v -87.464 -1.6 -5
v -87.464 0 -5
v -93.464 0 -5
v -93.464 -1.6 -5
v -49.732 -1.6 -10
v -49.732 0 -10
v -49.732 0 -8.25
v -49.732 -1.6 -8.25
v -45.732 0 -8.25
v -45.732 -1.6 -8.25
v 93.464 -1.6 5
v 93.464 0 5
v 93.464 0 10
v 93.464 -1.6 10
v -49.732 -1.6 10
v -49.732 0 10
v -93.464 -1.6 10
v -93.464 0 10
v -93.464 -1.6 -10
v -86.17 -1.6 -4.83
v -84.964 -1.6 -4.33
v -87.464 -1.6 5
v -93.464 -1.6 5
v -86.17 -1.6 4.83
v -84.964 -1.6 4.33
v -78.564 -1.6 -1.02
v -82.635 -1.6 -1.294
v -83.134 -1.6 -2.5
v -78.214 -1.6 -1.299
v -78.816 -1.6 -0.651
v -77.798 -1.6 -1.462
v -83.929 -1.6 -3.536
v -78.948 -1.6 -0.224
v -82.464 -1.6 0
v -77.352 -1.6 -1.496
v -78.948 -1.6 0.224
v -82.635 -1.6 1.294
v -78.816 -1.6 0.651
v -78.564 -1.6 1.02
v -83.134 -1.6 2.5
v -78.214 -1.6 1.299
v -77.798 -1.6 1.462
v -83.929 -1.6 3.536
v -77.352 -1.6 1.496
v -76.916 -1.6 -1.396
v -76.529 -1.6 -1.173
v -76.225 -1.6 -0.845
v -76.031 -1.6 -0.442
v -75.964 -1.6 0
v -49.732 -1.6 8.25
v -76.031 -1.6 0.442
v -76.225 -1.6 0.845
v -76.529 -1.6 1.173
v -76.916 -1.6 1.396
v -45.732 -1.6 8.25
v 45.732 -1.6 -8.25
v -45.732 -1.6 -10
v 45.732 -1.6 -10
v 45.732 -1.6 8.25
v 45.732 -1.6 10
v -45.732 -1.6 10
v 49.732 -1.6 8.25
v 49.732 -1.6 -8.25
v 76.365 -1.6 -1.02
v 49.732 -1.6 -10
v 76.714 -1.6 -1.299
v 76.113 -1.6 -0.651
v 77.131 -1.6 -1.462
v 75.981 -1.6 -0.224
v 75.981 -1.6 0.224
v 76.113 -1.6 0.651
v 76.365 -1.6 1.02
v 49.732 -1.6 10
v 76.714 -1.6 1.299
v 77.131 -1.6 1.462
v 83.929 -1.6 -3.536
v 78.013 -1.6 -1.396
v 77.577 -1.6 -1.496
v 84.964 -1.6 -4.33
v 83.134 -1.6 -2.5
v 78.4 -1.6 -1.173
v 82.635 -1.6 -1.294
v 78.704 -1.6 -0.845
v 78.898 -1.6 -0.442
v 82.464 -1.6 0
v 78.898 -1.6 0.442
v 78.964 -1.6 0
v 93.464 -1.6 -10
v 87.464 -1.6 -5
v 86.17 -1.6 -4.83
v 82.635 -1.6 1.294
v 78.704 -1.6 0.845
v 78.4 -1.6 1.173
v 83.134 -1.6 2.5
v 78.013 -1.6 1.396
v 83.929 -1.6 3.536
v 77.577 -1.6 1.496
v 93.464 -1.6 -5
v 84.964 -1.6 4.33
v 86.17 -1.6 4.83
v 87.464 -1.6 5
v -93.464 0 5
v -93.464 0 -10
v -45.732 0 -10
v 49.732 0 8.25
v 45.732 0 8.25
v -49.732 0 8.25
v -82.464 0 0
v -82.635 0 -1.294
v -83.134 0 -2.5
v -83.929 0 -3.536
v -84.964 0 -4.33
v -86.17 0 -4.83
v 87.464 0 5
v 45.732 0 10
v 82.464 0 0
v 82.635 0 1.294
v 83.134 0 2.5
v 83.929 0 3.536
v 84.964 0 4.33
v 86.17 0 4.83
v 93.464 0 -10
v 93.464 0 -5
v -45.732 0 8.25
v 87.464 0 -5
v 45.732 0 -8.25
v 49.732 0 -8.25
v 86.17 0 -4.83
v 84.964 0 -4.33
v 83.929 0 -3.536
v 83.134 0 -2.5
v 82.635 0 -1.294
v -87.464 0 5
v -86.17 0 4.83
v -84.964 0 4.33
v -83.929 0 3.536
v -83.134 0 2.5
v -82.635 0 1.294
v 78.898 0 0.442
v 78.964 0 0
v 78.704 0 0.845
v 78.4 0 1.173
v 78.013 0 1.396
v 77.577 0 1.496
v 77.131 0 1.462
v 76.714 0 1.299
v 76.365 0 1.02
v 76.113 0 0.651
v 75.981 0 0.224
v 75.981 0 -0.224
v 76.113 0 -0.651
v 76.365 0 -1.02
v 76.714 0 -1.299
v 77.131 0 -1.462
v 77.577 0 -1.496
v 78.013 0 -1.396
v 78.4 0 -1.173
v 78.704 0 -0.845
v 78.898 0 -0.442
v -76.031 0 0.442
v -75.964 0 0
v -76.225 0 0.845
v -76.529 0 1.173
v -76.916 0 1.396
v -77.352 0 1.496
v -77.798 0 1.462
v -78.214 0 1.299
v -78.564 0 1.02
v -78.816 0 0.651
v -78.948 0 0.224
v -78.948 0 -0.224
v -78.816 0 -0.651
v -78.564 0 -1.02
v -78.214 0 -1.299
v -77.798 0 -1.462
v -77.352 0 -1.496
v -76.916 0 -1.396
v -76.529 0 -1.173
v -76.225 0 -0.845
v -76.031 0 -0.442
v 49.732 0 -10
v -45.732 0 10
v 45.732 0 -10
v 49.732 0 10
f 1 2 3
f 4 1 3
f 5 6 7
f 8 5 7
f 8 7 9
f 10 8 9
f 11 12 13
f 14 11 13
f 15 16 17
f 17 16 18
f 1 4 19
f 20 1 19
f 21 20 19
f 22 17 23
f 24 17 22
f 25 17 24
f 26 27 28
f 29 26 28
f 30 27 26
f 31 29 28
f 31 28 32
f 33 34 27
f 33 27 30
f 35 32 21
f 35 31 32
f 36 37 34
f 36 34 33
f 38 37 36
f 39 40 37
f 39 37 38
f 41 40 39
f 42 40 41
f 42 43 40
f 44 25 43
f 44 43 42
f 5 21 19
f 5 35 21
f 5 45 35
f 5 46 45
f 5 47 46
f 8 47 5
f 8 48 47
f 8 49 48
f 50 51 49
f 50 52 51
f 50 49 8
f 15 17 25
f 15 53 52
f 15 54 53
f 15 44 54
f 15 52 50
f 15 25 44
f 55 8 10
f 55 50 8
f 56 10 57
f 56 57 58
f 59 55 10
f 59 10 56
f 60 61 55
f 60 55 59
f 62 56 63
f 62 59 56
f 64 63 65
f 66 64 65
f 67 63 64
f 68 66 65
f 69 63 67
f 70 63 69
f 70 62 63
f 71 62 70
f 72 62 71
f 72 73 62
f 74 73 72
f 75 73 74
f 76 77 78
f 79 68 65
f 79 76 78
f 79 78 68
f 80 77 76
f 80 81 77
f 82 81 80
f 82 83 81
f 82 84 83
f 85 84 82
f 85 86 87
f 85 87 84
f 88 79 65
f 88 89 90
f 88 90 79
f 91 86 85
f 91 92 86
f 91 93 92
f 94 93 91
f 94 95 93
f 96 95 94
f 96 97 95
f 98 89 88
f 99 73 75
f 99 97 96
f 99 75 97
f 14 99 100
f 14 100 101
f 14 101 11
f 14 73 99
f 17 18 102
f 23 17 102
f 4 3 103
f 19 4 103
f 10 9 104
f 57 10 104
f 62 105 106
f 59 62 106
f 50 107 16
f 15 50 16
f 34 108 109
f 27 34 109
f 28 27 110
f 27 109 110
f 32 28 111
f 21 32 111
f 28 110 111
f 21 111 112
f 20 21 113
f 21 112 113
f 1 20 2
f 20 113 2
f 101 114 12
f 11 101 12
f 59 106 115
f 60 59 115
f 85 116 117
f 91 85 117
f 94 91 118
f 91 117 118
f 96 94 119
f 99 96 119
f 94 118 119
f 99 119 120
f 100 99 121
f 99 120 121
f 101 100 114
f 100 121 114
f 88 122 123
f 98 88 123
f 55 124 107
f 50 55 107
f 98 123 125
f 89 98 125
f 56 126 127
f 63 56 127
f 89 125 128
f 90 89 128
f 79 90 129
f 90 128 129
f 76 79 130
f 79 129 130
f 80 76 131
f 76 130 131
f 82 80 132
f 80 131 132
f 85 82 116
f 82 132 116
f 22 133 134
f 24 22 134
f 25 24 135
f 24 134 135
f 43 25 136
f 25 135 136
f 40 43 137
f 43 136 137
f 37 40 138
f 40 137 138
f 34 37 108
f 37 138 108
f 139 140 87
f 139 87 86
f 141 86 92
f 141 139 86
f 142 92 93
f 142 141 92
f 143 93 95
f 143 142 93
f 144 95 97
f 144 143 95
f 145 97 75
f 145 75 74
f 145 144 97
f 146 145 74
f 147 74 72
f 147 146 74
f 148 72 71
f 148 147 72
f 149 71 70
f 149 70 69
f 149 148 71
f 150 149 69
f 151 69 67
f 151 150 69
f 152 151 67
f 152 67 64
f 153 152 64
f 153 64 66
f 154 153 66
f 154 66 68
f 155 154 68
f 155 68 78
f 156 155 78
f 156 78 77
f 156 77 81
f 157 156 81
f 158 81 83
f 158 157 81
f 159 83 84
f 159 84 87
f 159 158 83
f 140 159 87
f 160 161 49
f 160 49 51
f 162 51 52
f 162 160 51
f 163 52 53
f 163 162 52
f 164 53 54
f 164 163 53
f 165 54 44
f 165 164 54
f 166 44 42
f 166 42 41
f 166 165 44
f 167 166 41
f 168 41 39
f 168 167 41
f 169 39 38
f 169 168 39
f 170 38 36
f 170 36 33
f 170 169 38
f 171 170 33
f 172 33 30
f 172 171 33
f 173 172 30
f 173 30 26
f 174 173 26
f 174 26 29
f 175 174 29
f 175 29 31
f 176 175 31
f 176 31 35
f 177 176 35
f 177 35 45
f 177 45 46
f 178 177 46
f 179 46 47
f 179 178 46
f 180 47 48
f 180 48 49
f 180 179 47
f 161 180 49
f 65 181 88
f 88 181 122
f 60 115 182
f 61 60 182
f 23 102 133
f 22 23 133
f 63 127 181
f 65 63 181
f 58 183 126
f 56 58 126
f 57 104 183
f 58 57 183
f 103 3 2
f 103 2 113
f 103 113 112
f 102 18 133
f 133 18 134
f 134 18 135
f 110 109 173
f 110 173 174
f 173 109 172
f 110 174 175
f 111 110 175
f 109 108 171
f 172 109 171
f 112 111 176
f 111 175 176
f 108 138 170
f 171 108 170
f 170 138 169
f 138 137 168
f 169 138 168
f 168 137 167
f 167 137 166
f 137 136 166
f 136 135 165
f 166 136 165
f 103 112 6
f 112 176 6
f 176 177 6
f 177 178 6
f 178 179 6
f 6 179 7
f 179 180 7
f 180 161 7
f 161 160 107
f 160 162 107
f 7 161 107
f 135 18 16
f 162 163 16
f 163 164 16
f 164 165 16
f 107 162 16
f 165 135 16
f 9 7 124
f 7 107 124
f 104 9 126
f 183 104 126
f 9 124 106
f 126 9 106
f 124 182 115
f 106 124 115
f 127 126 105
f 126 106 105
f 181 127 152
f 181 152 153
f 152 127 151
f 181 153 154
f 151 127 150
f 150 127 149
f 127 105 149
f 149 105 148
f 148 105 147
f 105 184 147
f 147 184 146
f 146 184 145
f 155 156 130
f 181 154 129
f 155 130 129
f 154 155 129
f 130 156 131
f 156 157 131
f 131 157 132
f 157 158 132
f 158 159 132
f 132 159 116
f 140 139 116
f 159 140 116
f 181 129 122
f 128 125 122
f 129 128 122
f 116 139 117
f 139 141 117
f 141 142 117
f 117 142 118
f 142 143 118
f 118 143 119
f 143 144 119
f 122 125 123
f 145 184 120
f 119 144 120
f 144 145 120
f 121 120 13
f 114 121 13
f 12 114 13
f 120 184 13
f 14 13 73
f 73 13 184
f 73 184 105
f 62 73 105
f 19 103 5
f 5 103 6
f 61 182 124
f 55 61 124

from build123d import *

# Parameters (mm, degrees)
F0_R     = 1.5
F1_DEPTH = 1.6


with BuildPart() as f1:
    # F0 (on Front) → F1 (new body)
    with BuildSketch(Plane.XZ):
        with BuildLine():
            Line((-45.73225, 8.25), (-49.73225, 8.25))
            Line((-49.73225, 8.25), (-49.73225, 10))
            Line((-49.73225, 10), (-93.4645, 10))
            Line((-93.4645, 10), (-93.4645, 5))
            Line((-93.4645, 5), (-87.4645, 5))
            ThreePointArc((-87.4645, 5), (-83.928966, 3.535534), (-82.4645, 0))
            ThreePointArc((-82.4645, 0), (-83.928966, -3.535534), (-87.4645, -5))
            Line((-87.4645, -5), (-93.4645, -5))
            Line((-93.4645, -5), (-93.4645, -10))
            Line((-93.4645, -10), (-49.73225, -10))
            Line((-49.73225, -10), (-49.73225, -8.25))
            Line((-49.73225, -8.25), (-45.73225, -8.25))
            Line((-45.73225, -8.25), (-45.73225, -10))
            Line((-45.73225, -10), (0, -10))
            Line((0, -10), (45.73225, -10))
            Line((45.73225, -10), (45.73225, -8.25))
            Line((45.73225, -8.25), (49.73225, -8.25))
            Line((49.73225, -8.25), (49.73225, -10))
            Line((49.73225, -10), (93.4645, -10))
            Line((93.4645, -10), (93.4645, -5))
            Line((93.4645, -5), (87.4645, -5))
            ThreePointArc((87.4645, -5), (83.928966, -3.535534), (82.4645, 0))
            ThreePointArc((82.4645, 0), (83.928966, 3.535534), (87.4645, 5))
            Line((87.4645, 5), (93.4645, 5))
            Line((93.4645, 5), (93.4645, 10))
            Line((93.4645, 10), (49.73225, 10))
            Line((49.73225, 10), (49.73225, 8.25))
            Line((49.73225, 8.25), (45.73225, 8.25))
            Line((45.73225, 8.25), (45.73225, 10))
            Line((45.73225, 10), (0, 10))
            Line((0, 10), (-45.73225, 10))
            Line((-45.73225, 10), (-45.73225, 8.25))
        make_face()
        with Locations((-77.4645, 0)):
            Circle(F0_R, mode=Mode.SUBTRACT)
        with Locations((77.4645, 0)):
            Circle(F0_R, mode=Mode.SUBTRACT)
    extrude(amount=F1_DEPTH)


solid = f1.part
